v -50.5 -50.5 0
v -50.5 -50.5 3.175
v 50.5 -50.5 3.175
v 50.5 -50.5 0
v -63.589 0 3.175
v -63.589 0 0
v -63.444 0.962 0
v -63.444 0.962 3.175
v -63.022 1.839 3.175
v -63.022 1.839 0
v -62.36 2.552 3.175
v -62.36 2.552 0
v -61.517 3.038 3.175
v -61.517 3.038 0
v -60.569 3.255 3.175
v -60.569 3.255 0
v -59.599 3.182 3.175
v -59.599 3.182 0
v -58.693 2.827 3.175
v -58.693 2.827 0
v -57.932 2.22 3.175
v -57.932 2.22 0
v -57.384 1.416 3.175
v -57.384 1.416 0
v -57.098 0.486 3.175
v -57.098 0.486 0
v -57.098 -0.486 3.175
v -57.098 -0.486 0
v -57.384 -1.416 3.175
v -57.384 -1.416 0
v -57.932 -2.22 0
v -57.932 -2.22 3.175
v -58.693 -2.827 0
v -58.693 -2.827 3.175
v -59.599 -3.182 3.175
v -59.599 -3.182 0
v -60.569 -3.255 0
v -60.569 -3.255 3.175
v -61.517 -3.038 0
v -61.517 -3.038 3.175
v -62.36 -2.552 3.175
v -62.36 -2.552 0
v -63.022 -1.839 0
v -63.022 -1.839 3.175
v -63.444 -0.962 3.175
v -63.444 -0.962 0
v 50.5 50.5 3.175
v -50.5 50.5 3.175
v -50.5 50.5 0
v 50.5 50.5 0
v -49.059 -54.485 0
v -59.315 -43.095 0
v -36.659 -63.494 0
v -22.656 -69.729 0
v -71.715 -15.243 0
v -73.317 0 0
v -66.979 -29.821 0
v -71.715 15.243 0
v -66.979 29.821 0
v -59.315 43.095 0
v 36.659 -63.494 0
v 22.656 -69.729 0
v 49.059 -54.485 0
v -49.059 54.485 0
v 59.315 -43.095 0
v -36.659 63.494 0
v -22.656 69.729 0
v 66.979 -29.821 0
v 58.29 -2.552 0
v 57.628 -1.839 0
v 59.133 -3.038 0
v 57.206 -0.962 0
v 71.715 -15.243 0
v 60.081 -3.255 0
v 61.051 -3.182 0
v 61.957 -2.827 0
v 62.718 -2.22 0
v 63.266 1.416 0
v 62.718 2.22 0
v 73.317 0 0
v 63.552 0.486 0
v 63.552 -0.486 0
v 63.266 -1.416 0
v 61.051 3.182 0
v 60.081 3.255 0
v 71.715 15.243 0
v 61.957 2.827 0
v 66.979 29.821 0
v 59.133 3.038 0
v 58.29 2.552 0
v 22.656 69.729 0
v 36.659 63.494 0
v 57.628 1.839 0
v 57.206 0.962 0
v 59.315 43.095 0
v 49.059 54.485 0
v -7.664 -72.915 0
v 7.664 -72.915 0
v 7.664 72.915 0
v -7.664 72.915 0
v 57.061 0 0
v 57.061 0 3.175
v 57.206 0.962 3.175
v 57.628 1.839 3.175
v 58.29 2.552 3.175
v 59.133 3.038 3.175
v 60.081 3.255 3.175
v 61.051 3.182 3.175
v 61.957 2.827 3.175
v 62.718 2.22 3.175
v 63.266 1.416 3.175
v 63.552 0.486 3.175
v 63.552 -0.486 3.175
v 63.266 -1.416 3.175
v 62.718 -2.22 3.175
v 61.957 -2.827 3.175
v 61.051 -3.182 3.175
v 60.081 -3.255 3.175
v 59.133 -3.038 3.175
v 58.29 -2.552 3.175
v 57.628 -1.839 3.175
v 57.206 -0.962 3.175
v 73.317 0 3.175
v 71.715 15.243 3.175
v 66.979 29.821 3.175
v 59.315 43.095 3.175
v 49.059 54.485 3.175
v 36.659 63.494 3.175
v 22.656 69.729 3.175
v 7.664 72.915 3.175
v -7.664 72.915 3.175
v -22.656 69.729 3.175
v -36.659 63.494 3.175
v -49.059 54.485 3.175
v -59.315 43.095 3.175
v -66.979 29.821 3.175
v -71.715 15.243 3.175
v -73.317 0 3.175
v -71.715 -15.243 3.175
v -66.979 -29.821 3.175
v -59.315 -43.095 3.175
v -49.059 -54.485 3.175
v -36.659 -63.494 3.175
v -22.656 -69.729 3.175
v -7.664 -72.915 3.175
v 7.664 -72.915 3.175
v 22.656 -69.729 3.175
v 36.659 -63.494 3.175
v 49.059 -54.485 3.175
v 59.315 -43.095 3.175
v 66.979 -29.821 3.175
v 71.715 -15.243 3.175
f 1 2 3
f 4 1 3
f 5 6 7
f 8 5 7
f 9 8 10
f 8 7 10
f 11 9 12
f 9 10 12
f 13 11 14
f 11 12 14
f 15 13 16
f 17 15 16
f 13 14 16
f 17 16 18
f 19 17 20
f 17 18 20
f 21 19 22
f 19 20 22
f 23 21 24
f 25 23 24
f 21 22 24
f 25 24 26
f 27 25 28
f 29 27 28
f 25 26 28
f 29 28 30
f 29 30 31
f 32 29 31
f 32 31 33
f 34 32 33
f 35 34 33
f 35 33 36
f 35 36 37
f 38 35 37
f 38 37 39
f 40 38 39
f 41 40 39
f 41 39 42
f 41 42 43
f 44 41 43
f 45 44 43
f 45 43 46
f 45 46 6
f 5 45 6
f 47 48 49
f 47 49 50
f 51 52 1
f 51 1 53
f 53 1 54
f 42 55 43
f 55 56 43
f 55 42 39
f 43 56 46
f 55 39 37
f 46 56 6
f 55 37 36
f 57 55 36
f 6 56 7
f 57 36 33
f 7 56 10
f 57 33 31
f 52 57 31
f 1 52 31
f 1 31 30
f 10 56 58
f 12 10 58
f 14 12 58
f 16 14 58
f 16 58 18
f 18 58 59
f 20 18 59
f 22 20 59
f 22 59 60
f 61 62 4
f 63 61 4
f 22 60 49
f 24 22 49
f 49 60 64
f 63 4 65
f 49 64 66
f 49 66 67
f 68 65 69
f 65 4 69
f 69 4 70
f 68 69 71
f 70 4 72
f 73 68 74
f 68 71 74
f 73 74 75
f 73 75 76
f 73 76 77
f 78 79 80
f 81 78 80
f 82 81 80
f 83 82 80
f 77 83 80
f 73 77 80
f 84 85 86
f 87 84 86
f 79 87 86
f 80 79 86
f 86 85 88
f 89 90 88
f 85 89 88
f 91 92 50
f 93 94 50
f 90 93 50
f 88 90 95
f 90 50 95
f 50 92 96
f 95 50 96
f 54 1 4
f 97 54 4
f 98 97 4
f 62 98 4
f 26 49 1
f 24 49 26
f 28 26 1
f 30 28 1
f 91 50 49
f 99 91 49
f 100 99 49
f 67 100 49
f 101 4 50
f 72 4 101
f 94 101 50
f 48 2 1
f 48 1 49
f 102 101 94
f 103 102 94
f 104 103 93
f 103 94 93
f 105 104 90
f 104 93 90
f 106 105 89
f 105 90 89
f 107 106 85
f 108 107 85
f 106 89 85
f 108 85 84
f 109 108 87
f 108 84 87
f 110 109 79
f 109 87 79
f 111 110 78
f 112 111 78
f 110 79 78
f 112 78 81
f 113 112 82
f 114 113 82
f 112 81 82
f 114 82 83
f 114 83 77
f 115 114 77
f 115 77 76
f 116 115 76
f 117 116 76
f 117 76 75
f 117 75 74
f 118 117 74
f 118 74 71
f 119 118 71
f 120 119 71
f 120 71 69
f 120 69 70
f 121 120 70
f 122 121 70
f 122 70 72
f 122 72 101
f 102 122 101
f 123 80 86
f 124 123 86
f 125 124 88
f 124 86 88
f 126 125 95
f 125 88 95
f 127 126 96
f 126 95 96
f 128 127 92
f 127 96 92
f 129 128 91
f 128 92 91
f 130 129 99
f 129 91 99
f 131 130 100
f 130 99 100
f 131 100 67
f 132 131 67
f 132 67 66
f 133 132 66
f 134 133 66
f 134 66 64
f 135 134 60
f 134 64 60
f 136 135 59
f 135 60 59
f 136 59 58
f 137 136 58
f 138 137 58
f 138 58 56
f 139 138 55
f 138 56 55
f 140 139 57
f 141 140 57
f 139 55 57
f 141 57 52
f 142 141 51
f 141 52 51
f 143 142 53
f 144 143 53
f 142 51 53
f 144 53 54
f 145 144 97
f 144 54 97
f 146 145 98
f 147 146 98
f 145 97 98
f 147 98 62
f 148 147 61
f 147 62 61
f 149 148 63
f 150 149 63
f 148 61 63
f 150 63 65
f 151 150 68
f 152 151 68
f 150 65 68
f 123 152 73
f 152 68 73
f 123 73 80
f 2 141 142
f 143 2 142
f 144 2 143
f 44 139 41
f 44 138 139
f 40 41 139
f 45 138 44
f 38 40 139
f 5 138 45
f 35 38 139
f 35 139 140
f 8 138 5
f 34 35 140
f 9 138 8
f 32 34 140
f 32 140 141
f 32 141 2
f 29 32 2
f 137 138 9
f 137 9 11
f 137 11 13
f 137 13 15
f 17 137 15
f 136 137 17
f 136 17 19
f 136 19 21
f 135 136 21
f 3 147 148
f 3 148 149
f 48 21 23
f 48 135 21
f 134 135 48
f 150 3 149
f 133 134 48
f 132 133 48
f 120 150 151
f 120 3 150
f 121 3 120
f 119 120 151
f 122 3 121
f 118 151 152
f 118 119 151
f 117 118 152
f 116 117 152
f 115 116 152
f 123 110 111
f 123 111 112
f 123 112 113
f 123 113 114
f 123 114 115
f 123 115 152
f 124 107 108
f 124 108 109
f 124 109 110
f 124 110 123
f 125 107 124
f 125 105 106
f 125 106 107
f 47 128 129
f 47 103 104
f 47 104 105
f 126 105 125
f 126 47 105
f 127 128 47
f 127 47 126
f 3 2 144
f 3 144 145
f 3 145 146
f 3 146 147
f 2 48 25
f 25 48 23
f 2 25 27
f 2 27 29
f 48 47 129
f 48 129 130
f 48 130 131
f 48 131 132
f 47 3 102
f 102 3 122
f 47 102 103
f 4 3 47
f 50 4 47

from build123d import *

# Parameters (mm, degrees)
SKETCH1_R               = 73.3171
BOSS_EXTRUDE1_DEPTH     = 3.175
F_1_4_CLEARANCE_HOLE1_D = 6.5278
SKETCH4_W               = 100.99999993
SKETCH4_H               = 100.99999993
CUT_EXTRUDE1_DEPTH      = 1
CUT_EXTRUDE1_DEPTH_BACK = 4.175


with BuildPart() as part:
    # Sketch1 → Boss-Extrude1 (new body)
    with BuildSketch(Plane.XY):
        Circle(SKETCH1_R)
    extrude(amount=BOSS_EXTRUDE1_DEPTH)

    # 1/4 Clearance Hole1 (through all)
    with Locations(Plane.XY.offset(3.175)):
        with Locations((-60.325, 0), (60.325, 0)):
            Hole(F_1_4_CLEARANCE_HOLE1_D / 2)

    # Sketch4 → Cut-Extrude1 (cut, two sides)
    with BuildSketch(Plane.XY.offset(3.175)) as cut_extrude1_sk:
        Rectangle(SKETCH4_W, SKETCH4_H)
    extrude(amount=CUT_EXTRUDE1_DEPTH, mode=Mode.SUBTRACT)
    extrude(cut_extrude1_sk.sketch, amount=-CUT_EXTRUDE1_DEPTH_BACK, mode=Mode.SUBTRACT)


solid = part.part
